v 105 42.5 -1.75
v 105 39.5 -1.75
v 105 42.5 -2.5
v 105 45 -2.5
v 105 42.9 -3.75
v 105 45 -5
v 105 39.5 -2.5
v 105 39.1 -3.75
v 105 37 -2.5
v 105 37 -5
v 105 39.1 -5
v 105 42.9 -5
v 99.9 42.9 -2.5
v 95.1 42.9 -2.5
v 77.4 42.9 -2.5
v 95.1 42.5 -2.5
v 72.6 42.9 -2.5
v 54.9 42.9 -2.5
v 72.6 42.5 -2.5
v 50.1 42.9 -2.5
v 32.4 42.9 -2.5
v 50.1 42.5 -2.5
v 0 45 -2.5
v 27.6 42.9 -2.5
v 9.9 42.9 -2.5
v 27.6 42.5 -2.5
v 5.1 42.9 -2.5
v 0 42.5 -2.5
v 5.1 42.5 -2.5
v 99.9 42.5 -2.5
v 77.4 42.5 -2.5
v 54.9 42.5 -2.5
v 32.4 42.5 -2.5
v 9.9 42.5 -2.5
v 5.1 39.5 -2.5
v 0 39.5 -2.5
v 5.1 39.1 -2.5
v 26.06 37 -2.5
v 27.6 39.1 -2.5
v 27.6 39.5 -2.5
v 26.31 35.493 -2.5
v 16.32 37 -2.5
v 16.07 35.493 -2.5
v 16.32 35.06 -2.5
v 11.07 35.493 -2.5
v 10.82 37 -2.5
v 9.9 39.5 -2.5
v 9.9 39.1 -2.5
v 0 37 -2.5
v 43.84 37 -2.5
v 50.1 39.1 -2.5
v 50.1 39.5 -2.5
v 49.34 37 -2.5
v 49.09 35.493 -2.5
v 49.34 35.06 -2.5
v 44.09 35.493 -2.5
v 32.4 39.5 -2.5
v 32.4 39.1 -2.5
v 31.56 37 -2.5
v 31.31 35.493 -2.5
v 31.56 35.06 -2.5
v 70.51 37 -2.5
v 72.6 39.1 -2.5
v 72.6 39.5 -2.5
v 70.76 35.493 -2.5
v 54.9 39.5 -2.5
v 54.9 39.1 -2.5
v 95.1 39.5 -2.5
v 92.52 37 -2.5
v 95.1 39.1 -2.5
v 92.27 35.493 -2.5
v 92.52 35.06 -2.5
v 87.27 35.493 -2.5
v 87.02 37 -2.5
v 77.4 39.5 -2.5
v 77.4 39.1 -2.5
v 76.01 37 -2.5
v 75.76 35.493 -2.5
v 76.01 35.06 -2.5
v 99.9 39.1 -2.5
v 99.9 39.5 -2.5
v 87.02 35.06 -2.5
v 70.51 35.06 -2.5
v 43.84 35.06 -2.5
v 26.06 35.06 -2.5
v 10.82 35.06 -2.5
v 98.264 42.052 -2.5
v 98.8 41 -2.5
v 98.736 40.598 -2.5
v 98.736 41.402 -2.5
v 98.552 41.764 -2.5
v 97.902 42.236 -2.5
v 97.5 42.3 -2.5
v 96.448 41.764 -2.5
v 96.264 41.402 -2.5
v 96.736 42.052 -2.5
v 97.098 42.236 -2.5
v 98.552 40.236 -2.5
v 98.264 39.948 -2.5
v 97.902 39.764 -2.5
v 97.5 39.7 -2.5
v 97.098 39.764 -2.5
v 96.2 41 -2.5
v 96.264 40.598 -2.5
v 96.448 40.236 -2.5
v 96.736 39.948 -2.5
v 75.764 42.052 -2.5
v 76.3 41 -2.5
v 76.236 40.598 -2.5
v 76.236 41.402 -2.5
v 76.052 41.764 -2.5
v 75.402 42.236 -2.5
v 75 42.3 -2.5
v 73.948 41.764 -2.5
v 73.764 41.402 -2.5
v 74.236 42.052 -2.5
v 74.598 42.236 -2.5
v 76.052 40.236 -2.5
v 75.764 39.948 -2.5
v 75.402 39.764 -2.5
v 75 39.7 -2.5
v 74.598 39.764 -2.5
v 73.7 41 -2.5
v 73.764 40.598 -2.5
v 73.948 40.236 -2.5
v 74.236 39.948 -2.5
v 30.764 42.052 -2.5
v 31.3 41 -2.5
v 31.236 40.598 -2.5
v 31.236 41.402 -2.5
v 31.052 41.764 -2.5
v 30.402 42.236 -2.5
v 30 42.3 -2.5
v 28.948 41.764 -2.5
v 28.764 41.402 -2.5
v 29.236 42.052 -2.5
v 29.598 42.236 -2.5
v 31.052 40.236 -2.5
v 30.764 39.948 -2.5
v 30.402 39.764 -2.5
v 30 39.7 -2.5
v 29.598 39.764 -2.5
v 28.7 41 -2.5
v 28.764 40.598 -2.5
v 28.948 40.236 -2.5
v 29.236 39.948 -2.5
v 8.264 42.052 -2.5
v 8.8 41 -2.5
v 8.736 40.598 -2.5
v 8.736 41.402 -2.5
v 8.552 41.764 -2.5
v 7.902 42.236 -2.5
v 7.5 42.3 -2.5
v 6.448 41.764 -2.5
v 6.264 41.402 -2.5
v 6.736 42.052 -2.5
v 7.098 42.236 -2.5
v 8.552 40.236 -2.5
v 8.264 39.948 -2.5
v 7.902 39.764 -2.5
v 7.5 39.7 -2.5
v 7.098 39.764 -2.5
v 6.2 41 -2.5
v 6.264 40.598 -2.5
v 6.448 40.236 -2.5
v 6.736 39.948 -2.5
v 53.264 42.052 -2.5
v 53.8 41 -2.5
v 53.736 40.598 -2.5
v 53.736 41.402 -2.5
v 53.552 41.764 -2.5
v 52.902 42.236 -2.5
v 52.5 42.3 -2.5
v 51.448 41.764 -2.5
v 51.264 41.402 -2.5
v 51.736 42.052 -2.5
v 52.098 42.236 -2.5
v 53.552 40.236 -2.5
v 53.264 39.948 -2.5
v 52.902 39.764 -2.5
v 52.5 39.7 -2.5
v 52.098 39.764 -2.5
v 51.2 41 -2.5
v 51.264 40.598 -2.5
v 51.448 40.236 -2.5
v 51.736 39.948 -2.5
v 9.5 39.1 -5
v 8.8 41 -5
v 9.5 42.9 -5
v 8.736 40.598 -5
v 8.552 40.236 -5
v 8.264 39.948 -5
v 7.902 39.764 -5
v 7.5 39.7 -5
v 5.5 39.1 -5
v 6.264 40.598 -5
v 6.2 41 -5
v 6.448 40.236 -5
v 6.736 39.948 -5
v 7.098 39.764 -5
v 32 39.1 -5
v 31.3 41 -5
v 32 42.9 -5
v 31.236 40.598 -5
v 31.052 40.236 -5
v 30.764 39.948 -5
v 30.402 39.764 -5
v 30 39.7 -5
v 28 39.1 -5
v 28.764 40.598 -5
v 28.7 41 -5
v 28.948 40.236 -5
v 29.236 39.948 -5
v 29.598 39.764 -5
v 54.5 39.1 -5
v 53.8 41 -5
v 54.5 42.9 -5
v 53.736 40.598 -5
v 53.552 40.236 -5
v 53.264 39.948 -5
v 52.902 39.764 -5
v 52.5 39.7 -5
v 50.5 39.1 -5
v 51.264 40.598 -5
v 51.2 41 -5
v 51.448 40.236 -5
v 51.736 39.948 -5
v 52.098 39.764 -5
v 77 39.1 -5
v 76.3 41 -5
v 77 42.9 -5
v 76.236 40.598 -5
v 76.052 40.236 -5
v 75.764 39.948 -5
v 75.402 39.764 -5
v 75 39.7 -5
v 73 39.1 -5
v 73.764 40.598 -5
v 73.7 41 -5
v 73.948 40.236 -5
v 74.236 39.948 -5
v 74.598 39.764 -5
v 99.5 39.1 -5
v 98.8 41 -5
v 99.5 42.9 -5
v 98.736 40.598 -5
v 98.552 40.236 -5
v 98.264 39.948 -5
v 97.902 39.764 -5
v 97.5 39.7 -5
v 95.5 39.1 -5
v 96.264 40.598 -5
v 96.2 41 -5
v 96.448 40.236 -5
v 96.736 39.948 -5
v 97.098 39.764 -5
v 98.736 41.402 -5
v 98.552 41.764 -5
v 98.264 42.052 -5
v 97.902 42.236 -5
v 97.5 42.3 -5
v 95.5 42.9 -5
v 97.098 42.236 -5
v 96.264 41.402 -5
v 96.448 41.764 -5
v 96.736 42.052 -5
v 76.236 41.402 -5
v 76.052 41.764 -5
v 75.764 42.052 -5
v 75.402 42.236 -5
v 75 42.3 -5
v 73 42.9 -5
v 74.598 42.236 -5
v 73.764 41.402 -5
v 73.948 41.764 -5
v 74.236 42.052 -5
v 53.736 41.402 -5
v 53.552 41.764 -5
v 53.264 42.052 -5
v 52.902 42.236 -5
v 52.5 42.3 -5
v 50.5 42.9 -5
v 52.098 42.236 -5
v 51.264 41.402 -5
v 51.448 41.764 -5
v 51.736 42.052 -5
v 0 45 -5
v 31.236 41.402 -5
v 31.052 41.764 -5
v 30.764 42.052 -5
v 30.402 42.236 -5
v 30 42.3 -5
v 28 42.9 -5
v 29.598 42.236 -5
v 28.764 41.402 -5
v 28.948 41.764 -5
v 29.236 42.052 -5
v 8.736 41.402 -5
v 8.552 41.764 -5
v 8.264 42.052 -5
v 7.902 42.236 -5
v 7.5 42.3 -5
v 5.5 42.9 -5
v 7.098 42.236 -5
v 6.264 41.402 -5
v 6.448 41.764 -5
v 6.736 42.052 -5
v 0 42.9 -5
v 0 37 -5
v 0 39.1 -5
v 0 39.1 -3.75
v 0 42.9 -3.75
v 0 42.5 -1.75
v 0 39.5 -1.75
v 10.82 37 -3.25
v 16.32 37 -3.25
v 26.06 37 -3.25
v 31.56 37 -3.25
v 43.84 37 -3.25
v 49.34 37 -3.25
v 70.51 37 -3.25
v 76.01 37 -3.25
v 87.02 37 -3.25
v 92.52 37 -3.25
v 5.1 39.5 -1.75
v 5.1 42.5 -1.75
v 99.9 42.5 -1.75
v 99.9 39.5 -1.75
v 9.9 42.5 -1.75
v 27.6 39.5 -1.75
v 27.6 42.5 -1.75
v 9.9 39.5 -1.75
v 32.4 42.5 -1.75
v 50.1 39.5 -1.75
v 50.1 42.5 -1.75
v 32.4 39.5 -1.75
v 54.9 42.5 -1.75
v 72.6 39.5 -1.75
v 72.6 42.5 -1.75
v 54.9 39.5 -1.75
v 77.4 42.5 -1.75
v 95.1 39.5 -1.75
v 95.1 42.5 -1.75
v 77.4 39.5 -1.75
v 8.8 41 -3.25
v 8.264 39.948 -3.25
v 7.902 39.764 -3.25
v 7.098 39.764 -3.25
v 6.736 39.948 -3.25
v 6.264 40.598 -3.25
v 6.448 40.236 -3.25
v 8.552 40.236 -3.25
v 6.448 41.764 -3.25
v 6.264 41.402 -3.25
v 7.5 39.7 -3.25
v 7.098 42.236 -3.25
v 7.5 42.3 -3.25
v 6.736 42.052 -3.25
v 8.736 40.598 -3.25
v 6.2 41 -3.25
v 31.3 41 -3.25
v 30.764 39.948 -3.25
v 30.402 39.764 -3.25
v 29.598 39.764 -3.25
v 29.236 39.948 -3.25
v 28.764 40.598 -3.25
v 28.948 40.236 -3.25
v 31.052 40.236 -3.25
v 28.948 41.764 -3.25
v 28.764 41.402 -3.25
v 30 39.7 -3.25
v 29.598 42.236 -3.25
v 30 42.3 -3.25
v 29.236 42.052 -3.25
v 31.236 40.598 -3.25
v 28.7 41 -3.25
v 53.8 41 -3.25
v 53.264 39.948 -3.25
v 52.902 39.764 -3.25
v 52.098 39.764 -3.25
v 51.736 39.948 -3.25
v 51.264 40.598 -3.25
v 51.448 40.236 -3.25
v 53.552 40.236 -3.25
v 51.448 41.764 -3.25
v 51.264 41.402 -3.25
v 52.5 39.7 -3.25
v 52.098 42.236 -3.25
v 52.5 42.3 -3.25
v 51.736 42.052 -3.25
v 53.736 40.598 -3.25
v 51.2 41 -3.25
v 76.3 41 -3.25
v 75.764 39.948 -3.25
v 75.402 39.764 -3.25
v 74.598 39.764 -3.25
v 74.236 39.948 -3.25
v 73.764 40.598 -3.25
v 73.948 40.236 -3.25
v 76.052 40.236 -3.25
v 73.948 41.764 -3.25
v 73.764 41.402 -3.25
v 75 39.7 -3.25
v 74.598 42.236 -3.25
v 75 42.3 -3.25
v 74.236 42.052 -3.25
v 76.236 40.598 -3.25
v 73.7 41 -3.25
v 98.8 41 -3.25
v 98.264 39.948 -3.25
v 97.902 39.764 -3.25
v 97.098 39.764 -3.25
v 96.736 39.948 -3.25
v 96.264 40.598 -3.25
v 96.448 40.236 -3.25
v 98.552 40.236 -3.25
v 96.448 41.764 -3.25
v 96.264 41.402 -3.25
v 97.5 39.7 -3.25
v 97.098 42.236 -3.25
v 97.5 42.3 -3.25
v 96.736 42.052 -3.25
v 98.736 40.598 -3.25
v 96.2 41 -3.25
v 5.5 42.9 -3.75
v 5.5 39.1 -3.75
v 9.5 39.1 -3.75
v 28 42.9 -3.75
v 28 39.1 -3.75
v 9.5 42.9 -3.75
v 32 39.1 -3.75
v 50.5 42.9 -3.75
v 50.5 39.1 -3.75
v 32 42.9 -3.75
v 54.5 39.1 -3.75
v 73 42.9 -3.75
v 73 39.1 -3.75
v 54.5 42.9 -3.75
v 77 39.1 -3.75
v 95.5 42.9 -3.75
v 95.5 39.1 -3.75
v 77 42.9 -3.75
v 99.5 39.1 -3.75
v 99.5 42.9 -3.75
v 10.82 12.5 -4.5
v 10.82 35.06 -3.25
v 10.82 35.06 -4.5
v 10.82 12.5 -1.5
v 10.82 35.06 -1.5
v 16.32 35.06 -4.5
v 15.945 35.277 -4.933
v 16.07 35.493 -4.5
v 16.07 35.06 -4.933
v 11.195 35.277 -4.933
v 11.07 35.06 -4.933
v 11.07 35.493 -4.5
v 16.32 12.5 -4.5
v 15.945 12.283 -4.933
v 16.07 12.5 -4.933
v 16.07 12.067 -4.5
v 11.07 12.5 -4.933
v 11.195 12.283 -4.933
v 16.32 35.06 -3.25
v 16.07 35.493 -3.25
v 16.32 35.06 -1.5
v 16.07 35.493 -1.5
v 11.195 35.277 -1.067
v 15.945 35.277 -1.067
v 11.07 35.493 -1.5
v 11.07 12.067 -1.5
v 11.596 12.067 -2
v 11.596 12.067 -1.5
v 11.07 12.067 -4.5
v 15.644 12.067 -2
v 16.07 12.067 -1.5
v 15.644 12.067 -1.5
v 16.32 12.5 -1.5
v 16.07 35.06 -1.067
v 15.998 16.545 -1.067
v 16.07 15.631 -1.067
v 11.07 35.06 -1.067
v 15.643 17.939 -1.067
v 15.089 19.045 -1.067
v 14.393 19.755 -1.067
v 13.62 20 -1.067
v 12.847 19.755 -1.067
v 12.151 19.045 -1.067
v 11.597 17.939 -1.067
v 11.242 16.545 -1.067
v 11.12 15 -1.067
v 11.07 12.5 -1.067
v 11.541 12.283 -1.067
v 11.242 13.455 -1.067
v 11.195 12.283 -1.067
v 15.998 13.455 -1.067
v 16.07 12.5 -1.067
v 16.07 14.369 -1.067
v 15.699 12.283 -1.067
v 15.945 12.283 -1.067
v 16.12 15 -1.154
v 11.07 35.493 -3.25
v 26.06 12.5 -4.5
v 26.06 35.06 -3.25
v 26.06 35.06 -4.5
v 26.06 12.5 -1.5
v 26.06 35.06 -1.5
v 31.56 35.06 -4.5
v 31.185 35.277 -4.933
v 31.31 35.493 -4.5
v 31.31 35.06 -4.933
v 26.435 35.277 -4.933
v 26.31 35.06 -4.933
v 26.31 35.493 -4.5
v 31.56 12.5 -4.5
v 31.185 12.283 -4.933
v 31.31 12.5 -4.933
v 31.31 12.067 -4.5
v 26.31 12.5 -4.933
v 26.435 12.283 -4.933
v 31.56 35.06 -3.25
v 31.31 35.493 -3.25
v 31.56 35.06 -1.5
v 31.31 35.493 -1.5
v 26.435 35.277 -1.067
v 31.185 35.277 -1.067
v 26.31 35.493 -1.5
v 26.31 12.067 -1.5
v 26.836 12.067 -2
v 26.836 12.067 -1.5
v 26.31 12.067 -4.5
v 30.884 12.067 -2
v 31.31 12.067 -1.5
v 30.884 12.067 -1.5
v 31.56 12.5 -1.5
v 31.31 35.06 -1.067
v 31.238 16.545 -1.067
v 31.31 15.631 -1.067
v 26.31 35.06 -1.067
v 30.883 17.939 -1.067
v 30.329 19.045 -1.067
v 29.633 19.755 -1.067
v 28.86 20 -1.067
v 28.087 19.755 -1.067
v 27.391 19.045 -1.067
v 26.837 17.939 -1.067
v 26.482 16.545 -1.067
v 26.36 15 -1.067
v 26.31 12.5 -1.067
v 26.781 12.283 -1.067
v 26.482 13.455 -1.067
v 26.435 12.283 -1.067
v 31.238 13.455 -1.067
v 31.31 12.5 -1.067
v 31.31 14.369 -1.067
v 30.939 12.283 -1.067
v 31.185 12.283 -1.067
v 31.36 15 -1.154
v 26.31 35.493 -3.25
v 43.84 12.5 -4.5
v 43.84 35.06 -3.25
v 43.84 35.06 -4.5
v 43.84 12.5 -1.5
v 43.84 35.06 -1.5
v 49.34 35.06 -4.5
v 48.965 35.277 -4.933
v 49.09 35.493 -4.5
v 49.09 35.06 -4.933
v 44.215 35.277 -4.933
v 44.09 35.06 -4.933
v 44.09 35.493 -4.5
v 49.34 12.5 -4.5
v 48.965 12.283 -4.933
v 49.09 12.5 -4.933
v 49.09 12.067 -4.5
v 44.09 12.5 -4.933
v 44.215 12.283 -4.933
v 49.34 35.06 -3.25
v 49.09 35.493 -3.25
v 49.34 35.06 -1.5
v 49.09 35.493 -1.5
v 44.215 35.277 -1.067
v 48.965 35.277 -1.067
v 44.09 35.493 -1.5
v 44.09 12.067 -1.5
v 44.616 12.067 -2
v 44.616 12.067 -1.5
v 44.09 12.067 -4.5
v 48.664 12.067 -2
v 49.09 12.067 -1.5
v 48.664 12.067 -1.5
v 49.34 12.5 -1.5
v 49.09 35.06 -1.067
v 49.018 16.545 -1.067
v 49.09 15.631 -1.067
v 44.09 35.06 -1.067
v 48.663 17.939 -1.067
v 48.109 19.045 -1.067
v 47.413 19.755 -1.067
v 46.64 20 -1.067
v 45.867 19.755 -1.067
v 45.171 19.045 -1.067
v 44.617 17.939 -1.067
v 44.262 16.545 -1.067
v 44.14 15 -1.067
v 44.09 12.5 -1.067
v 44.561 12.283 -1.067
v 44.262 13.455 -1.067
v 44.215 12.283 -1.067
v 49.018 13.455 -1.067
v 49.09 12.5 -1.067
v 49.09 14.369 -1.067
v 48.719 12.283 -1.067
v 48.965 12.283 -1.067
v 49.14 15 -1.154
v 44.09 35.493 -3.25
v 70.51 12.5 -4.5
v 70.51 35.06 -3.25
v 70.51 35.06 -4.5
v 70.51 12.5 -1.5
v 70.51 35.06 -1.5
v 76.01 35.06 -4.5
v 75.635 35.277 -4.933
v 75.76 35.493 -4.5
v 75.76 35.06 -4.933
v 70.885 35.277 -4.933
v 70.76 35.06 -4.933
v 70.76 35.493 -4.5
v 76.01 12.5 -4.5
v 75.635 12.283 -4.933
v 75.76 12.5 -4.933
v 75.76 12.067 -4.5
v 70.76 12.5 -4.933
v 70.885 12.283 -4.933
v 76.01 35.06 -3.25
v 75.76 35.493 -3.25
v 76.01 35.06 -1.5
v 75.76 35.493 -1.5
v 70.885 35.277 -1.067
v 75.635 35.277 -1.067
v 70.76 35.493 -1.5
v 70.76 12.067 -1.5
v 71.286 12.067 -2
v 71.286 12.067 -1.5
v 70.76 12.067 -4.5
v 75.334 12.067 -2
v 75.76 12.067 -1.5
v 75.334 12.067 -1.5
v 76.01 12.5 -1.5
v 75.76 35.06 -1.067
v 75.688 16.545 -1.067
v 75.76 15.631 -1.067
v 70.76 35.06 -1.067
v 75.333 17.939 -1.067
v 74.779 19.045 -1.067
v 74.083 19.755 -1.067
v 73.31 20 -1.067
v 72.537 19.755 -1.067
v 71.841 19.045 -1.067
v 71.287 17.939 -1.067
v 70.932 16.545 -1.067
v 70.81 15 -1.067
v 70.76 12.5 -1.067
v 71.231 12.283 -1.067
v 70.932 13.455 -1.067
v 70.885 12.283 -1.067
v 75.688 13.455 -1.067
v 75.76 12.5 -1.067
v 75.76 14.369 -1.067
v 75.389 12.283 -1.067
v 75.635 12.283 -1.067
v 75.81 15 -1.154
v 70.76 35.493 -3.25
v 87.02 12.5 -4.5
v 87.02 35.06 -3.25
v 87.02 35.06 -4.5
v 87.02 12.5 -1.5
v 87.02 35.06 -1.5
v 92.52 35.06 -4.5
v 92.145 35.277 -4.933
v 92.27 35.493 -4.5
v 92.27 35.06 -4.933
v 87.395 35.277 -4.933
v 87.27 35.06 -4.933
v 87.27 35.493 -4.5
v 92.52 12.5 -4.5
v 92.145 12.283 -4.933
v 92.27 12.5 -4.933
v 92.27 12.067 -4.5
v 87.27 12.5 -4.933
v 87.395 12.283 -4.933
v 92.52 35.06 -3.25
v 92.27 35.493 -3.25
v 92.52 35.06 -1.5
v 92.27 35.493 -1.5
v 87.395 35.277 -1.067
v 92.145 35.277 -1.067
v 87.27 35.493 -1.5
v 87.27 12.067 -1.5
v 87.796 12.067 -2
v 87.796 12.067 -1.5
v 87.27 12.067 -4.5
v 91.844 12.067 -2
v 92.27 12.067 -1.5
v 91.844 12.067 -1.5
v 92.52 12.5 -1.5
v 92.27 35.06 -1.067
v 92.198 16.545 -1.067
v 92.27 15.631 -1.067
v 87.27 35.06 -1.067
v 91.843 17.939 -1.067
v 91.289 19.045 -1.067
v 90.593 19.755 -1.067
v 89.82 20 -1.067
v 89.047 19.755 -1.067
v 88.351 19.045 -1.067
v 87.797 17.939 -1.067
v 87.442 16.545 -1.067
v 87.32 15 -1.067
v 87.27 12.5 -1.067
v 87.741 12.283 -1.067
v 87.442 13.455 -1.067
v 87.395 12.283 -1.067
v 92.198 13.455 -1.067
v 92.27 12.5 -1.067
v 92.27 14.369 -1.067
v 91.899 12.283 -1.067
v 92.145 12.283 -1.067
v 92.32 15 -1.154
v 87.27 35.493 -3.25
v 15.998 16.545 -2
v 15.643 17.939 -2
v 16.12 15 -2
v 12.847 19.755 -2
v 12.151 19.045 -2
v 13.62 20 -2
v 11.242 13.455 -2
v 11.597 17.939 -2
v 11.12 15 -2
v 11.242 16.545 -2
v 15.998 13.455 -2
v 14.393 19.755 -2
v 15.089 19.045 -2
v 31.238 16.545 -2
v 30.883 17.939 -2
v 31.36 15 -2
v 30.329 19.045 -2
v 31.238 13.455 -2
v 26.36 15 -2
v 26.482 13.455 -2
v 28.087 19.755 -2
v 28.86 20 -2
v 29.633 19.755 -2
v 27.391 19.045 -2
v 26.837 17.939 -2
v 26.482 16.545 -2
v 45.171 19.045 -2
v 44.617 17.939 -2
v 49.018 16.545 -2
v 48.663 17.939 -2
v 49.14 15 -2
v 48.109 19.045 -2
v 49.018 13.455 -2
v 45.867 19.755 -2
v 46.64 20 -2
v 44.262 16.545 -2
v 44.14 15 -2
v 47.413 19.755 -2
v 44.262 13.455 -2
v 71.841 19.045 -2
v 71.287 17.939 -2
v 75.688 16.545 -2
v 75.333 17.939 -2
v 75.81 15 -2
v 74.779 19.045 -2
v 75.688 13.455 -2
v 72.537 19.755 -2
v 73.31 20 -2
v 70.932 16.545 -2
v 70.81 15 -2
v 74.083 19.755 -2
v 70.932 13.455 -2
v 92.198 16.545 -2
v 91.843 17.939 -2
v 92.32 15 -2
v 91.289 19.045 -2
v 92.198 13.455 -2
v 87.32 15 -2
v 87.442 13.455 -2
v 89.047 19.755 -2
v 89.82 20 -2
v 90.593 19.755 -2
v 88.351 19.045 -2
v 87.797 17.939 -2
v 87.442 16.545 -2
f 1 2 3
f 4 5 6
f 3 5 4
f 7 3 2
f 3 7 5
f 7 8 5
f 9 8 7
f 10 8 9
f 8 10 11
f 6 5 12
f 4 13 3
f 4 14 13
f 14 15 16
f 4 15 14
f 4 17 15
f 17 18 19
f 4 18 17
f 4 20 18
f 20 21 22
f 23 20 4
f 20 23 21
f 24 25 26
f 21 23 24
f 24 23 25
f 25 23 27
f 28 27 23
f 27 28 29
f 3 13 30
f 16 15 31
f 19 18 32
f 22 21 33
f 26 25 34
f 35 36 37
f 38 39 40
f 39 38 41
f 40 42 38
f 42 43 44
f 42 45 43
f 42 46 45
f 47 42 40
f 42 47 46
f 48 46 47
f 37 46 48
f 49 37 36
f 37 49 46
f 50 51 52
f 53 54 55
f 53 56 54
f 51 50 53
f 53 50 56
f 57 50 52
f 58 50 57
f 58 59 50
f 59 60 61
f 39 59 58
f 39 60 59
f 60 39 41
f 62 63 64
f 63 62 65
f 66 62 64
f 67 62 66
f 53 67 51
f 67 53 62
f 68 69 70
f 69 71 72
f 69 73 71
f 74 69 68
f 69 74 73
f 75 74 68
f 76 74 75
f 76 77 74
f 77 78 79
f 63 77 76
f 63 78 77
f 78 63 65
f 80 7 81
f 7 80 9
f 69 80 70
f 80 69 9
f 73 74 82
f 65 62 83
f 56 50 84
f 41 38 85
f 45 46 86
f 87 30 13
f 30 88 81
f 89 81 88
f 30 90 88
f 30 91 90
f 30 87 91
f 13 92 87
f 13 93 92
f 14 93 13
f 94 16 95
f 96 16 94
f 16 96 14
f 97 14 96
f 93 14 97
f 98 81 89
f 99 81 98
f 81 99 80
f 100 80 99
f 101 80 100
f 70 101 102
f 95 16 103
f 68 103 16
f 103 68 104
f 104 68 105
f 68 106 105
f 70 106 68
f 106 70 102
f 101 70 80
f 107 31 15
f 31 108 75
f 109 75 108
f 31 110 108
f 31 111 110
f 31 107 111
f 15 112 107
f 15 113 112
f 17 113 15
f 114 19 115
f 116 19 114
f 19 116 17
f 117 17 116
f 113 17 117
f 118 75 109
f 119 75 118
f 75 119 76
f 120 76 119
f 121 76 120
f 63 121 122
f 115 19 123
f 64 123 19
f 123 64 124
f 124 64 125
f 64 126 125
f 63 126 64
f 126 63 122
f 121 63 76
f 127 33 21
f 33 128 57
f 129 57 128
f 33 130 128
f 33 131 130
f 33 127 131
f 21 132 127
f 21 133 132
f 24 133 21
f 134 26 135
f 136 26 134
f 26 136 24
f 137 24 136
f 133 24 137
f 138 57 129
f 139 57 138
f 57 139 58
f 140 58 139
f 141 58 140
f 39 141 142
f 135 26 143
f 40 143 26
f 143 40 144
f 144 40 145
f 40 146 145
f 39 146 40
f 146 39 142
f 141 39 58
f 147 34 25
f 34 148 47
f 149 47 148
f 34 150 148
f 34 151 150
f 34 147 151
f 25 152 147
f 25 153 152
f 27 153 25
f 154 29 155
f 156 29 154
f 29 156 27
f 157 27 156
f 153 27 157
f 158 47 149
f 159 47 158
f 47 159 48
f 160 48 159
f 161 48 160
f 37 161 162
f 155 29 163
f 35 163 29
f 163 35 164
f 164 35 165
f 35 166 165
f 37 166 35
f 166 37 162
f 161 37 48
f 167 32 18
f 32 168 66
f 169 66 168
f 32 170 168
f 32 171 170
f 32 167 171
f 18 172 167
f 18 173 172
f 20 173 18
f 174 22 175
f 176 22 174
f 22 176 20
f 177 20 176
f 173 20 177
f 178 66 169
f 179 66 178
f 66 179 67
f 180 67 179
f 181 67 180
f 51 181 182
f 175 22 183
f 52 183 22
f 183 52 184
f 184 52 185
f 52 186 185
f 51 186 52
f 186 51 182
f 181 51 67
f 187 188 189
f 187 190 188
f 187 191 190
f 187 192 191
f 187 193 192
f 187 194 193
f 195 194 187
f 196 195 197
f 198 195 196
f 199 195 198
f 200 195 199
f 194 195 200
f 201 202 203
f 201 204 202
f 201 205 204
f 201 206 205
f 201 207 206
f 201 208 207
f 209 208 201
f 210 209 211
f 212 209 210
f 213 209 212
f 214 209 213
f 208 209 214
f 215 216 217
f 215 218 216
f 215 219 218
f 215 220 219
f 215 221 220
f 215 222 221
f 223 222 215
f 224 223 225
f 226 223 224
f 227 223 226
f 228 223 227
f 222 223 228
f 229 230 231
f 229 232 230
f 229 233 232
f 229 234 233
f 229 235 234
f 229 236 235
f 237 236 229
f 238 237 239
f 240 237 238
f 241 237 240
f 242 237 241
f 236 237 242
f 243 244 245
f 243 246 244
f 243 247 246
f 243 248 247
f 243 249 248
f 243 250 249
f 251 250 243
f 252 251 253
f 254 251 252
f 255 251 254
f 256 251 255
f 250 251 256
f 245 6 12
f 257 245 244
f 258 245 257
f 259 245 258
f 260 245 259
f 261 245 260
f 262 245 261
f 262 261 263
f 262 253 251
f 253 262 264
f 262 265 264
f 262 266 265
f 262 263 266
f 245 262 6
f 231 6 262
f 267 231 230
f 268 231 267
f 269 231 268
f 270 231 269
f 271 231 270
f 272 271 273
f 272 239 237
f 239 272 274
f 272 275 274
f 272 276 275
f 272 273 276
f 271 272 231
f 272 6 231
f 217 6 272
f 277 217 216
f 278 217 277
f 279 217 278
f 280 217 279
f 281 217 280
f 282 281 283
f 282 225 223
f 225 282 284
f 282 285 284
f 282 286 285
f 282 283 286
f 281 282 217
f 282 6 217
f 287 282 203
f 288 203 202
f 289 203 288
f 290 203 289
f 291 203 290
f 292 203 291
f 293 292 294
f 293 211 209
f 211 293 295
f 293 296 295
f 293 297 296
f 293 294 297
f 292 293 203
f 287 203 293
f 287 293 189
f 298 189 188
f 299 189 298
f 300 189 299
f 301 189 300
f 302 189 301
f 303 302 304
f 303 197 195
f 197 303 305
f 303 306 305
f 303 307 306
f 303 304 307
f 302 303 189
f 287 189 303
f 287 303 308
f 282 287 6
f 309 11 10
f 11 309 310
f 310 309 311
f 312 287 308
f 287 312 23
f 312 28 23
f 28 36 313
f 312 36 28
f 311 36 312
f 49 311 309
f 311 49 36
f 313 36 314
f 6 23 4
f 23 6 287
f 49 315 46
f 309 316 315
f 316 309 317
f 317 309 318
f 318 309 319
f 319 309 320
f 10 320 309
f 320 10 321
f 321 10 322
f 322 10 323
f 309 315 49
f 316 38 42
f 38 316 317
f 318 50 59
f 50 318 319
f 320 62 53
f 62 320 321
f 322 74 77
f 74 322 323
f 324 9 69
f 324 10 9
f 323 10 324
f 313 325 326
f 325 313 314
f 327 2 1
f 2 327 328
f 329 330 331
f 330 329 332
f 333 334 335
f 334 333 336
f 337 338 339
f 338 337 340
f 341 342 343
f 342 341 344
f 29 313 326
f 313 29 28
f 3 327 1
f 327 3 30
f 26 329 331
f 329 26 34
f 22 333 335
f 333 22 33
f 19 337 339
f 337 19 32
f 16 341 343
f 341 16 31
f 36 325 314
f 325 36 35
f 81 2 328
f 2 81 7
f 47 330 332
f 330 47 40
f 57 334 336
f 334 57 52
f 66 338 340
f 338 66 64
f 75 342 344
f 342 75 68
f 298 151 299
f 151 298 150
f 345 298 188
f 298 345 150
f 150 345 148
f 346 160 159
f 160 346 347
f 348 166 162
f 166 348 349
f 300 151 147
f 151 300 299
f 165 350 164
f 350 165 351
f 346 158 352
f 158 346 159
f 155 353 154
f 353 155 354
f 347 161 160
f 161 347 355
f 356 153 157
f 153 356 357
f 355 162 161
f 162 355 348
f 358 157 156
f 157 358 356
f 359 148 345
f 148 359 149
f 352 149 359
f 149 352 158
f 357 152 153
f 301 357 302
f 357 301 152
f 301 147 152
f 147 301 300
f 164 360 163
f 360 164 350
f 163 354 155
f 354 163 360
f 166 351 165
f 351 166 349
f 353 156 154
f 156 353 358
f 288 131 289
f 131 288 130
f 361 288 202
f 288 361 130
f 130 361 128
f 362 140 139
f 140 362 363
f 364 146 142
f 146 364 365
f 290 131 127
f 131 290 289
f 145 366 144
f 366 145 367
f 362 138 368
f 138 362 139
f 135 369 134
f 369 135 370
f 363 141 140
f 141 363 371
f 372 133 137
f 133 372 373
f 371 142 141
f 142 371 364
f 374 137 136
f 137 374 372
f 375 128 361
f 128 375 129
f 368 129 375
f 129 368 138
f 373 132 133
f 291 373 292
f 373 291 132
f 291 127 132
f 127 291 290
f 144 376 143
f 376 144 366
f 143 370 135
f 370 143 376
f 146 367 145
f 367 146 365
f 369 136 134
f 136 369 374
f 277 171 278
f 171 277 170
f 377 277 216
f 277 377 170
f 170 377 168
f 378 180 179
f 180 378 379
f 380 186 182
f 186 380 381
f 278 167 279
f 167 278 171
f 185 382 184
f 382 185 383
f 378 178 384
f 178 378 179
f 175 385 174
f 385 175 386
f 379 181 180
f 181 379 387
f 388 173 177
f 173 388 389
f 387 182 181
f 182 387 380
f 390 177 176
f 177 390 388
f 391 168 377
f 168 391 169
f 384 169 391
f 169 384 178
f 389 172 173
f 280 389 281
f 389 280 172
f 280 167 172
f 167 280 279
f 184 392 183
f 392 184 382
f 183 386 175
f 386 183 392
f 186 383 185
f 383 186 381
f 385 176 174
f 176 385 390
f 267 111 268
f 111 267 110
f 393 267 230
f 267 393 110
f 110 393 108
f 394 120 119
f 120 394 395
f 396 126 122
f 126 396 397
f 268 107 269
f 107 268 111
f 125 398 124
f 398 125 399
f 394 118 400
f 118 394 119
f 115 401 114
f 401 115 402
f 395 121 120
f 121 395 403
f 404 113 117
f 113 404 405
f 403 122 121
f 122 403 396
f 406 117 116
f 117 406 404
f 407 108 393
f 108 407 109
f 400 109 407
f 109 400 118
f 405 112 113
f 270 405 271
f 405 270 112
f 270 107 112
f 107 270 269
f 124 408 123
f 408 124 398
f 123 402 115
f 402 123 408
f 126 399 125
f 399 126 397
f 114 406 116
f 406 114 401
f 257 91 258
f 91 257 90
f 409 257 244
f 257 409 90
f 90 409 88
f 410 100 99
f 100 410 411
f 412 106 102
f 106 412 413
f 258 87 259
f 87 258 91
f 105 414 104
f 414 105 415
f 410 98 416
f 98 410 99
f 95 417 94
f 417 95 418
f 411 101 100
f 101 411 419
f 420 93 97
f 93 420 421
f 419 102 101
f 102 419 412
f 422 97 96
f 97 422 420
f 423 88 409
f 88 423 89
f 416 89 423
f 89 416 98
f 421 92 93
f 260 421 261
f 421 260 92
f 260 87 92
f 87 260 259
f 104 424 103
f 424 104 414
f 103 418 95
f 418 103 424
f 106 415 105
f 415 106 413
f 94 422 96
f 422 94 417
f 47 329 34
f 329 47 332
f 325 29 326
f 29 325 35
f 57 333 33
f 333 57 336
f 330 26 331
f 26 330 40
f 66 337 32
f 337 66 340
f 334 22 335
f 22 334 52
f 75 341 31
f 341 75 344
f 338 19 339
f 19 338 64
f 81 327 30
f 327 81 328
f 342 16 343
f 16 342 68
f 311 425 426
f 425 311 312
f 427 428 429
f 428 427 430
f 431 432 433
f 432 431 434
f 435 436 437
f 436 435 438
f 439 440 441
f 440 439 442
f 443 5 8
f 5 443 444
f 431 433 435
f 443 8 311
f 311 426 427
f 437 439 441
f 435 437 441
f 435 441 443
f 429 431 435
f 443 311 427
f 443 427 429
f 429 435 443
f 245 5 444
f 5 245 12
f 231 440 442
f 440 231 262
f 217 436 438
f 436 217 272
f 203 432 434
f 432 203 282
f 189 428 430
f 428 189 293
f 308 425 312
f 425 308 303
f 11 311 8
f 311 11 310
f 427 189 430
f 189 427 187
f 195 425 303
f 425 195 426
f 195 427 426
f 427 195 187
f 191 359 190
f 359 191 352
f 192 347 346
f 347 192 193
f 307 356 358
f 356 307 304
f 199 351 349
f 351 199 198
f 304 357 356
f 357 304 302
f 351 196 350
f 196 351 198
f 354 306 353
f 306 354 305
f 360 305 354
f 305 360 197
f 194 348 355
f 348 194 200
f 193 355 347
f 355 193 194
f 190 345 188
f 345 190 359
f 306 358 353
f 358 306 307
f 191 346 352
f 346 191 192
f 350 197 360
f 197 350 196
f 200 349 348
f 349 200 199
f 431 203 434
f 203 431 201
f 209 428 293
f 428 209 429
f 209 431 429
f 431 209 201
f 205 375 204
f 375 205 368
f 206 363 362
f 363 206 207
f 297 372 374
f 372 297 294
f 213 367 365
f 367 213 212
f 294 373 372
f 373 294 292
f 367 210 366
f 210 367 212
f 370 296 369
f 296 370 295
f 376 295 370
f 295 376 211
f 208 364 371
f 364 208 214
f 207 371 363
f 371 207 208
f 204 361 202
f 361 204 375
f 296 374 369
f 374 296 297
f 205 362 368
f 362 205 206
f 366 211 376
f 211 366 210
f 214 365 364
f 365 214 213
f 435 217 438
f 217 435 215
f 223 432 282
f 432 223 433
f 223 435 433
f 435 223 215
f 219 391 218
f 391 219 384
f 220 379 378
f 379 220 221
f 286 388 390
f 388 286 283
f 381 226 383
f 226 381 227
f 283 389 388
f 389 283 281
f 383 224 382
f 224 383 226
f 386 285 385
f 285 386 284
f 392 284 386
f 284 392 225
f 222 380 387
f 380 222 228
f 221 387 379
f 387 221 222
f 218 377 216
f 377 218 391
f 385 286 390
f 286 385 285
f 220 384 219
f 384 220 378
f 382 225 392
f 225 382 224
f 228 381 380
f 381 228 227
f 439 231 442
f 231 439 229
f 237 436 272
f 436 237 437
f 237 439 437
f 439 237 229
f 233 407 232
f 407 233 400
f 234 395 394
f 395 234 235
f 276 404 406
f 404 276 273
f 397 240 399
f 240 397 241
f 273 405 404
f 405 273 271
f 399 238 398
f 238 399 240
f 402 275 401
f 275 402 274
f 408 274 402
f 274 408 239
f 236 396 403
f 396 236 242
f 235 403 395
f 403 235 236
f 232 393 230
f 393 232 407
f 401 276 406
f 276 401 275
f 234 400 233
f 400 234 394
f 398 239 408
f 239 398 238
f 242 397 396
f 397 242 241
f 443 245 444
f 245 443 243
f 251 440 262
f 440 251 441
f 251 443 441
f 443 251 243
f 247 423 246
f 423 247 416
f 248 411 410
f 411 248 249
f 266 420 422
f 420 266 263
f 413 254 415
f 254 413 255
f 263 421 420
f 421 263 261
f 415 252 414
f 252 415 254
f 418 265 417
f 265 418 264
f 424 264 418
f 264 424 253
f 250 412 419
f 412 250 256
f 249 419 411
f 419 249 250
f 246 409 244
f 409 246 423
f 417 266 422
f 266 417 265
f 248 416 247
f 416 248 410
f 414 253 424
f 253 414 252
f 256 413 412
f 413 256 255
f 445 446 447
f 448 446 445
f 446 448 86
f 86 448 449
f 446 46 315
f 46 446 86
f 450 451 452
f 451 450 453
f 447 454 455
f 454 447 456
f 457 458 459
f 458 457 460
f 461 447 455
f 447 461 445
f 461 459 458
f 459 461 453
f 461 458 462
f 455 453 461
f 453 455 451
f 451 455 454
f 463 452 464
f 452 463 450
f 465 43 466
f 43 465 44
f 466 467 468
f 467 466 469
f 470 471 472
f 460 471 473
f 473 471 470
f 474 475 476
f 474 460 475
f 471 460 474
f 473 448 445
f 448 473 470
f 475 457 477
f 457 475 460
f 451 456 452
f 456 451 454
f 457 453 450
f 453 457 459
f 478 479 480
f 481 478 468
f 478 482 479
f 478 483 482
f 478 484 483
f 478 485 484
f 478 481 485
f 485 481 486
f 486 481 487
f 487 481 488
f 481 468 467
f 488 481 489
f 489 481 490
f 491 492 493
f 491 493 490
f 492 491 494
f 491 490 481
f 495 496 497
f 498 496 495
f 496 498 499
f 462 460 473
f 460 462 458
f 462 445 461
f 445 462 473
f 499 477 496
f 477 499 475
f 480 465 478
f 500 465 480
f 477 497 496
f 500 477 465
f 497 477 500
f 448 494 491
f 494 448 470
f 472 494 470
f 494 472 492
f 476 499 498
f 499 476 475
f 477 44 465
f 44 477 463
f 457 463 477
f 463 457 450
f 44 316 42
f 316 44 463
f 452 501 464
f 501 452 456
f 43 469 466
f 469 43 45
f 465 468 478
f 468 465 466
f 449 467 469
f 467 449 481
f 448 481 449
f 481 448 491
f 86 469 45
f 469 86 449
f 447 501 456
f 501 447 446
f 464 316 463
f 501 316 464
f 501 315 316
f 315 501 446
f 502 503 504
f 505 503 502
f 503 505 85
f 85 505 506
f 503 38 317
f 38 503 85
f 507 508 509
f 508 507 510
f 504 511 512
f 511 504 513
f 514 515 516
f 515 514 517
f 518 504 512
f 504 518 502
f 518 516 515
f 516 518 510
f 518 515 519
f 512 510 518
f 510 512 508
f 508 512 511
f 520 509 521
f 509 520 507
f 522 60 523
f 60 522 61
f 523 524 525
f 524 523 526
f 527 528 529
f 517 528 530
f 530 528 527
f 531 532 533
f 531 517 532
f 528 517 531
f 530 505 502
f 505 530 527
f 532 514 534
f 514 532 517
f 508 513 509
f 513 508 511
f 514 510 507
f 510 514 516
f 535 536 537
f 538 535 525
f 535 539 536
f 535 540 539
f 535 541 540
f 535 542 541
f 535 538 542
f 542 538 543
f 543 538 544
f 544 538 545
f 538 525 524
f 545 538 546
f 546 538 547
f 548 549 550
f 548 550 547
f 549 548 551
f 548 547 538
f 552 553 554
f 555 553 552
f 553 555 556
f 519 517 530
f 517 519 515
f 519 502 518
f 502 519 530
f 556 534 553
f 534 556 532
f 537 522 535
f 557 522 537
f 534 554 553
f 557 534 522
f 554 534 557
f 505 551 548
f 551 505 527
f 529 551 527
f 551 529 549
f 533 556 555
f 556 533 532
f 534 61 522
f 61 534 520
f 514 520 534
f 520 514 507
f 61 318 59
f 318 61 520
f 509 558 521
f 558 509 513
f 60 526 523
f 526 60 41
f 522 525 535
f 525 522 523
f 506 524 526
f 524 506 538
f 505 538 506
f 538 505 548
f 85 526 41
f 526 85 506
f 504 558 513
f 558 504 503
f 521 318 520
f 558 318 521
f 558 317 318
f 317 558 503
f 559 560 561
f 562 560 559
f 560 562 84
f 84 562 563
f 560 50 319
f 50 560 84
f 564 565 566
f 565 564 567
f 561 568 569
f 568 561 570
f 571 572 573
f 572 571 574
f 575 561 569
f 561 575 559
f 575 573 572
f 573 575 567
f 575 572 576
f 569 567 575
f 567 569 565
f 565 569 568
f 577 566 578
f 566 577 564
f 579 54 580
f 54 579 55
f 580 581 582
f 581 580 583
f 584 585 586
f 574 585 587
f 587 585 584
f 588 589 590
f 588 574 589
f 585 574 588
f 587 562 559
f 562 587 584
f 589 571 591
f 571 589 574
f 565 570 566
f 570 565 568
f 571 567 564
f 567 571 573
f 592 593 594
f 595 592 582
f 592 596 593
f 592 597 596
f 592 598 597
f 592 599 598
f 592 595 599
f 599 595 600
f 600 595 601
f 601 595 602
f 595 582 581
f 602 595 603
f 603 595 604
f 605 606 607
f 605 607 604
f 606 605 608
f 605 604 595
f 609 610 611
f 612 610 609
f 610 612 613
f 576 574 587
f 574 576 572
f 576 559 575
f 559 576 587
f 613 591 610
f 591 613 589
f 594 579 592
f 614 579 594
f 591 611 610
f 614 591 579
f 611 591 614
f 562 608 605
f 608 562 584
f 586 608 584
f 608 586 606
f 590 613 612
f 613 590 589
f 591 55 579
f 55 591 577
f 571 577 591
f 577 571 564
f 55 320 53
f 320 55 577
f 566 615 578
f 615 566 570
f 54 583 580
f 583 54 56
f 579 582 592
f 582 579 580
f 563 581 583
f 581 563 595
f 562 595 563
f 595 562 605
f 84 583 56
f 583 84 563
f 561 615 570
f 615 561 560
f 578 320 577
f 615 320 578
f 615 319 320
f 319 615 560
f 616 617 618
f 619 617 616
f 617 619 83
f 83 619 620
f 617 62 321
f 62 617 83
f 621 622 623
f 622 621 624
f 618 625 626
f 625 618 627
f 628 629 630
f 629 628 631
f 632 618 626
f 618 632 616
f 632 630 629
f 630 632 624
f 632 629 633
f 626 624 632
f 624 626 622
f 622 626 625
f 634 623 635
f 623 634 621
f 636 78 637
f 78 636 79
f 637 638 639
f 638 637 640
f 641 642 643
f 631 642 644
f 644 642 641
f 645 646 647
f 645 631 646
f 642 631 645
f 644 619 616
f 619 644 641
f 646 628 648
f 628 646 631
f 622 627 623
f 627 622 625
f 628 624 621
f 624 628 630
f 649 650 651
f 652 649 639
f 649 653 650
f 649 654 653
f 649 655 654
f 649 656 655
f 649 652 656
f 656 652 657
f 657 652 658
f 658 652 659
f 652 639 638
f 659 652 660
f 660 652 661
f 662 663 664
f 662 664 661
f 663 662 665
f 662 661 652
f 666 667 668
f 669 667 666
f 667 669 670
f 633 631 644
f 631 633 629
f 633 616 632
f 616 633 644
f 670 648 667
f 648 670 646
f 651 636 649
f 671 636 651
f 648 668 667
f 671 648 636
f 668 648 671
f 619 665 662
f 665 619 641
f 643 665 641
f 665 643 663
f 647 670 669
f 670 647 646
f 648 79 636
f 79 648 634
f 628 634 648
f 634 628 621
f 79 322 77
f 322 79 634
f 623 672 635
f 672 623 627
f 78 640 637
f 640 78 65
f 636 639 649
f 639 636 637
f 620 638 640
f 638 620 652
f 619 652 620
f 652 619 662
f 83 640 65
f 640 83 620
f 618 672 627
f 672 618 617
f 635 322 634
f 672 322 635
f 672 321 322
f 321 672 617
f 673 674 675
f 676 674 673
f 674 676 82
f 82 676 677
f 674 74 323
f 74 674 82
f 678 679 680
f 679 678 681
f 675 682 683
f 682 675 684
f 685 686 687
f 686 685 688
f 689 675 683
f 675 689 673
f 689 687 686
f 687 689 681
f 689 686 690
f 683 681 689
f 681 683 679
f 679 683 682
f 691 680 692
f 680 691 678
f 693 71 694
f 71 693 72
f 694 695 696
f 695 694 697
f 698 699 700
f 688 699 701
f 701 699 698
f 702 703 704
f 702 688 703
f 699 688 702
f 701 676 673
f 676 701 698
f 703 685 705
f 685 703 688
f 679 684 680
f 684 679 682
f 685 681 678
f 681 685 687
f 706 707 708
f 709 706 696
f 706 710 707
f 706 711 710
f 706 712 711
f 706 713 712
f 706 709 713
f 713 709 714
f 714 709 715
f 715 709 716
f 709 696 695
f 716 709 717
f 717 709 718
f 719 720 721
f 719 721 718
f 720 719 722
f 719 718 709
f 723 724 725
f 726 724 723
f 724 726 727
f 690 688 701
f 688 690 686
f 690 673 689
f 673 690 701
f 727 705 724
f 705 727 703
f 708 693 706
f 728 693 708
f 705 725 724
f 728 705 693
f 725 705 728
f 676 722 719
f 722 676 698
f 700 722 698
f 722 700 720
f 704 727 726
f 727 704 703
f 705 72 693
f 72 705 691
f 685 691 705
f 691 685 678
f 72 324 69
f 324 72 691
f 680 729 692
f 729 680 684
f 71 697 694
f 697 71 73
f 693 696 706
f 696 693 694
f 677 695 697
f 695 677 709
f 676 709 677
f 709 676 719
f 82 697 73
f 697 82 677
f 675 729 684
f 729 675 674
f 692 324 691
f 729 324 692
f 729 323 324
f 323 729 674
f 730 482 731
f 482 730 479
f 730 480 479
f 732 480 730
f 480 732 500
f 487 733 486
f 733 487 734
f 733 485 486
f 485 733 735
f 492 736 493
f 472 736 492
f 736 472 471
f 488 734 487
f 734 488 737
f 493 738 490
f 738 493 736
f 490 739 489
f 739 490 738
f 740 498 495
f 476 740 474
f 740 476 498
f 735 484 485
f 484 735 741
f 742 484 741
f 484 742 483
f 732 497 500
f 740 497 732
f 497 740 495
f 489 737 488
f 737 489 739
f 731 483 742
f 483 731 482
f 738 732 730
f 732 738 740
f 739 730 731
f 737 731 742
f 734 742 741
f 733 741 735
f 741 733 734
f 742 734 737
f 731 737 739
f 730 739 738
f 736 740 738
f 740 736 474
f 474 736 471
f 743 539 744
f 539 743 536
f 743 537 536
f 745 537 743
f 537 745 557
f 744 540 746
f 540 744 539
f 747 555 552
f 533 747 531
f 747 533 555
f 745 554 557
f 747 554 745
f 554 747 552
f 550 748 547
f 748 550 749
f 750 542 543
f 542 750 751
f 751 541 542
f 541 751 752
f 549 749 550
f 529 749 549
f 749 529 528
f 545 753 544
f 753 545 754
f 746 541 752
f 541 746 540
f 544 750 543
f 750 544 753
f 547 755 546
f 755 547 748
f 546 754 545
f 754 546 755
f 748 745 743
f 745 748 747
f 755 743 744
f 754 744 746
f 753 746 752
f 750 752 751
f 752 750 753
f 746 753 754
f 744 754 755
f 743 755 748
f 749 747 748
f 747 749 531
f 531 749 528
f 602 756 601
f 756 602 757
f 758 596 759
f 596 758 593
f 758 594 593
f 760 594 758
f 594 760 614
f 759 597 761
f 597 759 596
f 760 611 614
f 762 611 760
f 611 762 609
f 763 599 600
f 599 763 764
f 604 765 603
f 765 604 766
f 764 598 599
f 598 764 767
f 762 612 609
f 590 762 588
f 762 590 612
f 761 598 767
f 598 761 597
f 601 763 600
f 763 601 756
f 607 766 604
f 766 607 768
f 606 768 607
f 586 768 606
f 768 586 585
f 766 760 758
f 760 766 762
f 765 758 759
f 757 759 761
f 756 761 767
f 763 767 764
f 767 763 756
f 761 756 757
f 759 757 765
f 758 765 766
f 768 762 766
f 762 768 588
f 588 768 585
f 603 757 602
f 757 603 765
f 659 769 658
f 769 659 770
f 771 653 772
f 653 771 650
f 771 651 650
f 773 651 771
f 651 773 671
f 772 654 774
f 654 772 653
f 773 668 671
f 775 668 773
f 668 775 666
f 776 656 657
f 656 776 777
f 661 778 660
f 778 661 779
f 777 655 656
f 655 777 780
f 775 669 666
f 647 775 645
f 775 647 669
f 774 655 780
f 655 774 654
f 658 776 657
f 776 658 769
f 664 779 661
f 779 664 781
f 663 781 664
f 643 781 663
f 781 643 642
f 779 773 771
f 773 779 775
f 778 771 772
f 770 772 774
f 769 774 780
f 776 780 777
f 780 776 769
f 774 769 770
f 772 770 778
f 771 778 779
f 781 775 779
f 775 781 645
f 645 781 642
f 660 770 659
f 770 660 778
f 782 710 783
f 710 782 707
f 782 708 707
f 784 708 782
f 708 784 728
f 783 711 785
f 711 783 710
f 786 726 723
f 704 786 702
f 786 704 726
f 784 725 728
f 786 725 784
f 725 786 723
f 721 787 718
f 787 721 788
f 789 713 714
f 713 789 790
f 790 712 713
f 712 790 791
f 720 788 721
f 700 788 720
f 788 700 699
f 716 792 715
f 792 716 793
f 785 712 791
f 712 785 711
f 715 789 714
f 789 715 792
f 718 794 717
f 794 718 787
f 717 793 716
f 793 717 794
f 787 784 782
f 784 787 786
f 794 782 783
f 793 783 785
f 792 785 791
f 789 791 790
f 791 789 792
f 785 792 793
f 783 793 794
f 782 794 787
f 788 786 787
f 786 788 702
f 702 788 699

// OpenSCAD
$fn = 20;
//white key total length
wktl = 38-3;

//black key total length
bktl = 26-3-.5;

//white keys total width
wktw = 105;

//black key total width
bktw = 5.5;

//distance between keys
dbk = 8;


//dist1
d1 = 7.62;

//dist2
d2 = 8.89;


//white key thickness
wkth = 2.5;

//black key thickness
bkth = 4;

//white key lip height
wklh = 5;

//spring length
sl = 2;

//black spring length
bsl = 2;

//spring width
sw = 10;

//spring thickness
sth = .75;

//key tolerance
key_tol = .9;

//black key tolerance
black_key_tol = 1.5;

//distance between white keys
dbwk = wktw+key_tol;


module white_keys()
{
  //slim width
  sw = wktw-bktw-key_tol;

  
  union()
  {
  cube([wktw,wktl,wkth]);
  translate([0,-wkth,0])
  cube([wktw,wkth,wklh]);
  }



  
  /*
  translate([0,wktl+sl,0])
  color("brown")
  translate([bktw/2+key_tol/2,0,0])
  {


  difference()
  {
  cube([sw,8,wkth]);
  translate([sw/2,4,-2])
  cylinder(r=1.6, h=10);
  }
  }
  */

  //spring
  translate([0,wktl,wkth-sth])
  //cube([sw,sl,sth]);
  cube([wktw,sl,sth]);

}


module black_key(tol=0)
{

  difference()
  {
  minkowski()
  {
    translate([.5-tol,-tol,0])
    cube([bktw-1+tol*2, bktl-.4+tol*2+tol+.46, bkth-1]);
    sphere(r=.5, $fn=6);
  }

  //foil hole
  //translate([1,1,bkth-2])
  //cube([bktw-2,bktw,5]);
  }

  //spring
  translate([0,bktl,wkth-sth-.5])
  cube([bktw,bsl,sth]);


  //translate([bktw/2,0,bkth])
  //foil_holder();

}

module foil_holder()
{
  /*
  height=2;
  diameter=6+1;
  thickness=1;
  d = diameter;

  translate([0,diameter/2-3,0])
  difference()
  {
    scale([1,1.5,1])
    cylinder(d=diameter, h=height);
    //cylinder(d=diameter-thickness*2, h=height);
    scale([1,1.5,1])
    translate([-d/2,-d/2,height-.8])
    rotate([6,0,0])
    cube([d,d+.2,10]);
  }
  */
  translate([0,0,-2])
  scale([1,2,1])
  cylinder(d=5, h=2.2);


}


module holder_bar(length=wktw)
{
  width = 8;
  ridge_width=3;
  ridge_height=.75;
  tol = .8;
  hole_diameter=2.6;

  square_width=4;

  w = 22.5;

  difference()
  {
  union()
  {
  cube([length,width,wkth]);
  //ridge
  translate([0,width/2-ridge_width/2,0])
  cube([length,ridge_width,wkth+ridge_height]);

  }

  for(i=[0:4])
  translate([7.5+i*w,width/2,-1])
  cylinder(d=hole_diameter,h=10);


  //cubes
  for(i=[0:4])
  translate([7.5+i*w,width/2,wkth+ridge_height/2])
  //cylinder(d=2.5,h=10);
  cube([square_width+tol,ridge_width+tol,ridge_height], center=true);



  //ridge
  translate([0,width/2-ridge_width/2-tol/2,-2])
  cube([length,ridge_width+tol,wkth+ridge_height]);
  }


  //cubes with cylindrical holes
  for(i=[0:4])
  {
  translate([7.5+i*w,width/2,ridge_height/2+.5])
  difference()
  {
  cube([square_width,ridge_width+tol,ridge_height+1], center=true);
  translate([0,0,-5])
  cylinder(d=hole_diameter,h=10);
  }

  }


}

module all_black_keys()
{
  translate([0,bktl+bsl,0])
  holder_bar();


  difference()
  {
  translate([3+.2,0,.5])
  union()
  {
  translate([d1,0,0])
  black_key();

  translate([d1*3, 0,0])
  black_key();

  translate([d1*3+d2*2, 0,0])
  black_key();

  translate([d1*3+d2*5, 0,0])
  black_key();

  translate([d1*4+d2*6, 0,0])
  black_key();
  }




  }

  //translate([-6+d1,0,5])
  //foil_holder();
}


module all_white_keys()
{
  //total length
  //tl = dbwk*7-key_tol;
  tl = dbwk*7;

  translate([0,wktl+sl,0])
  holder_bar();



white_keys();

}




difference()
{
union()
{
translate([0,wktl-bktl-(bsl-sl),-5])
all_black_keys();
//all_white_keys();
}


  //white keys!
  translate([2+4,-7+3+4,0])
  {
  translate([0,15,wkth])
  foil_holder();


  translate([d1*2,15,wkth])
  foil_holder();


  translate([d1*3+d2,15,wkth])
  foil_holder();


  translate([d1*3+d2*3,15,wkth])
  foil_holder();

  translate([d1*3+d2*4,15,wkth])
  foil_holder();

  translate([d1*3+d2*6,15,wkth])
  foil_holder();


  translate([d1*5+d2*6,15,wkth])
  foil_holder();
  }


  //black keys
  translate([6,15,0])
  {
  translate([d1,0,0])
  foil_holder();

  translate([d1*3,0,0])
  foil_holder();

  translate([d1*3+d2*2,0,0])
  foil_holder();

  translate([d1*3+d2*5,0,0])
  foil_holder();

  translate([d1*4+d2*6,0,0])
  foil_holder();
  }

  translate([3,12,0])
  {
translate([d1,0,0])
  black_key(tol=1);

  translate([d1*3, 0,0])
  black_key(tol=1);

  translate([d1*3+d2*2, 0,0])
  black_key(tol=1);

  translate([d1*3+d2*5, 0,0])
  black_key(tol=1);

  translate([d1*4+d2*6, 0,0])
  black_key(tol=1);
  }


  //slits
  translate([d1*2-(bktw-1)/2,-30,-1])
  cube([1,42,20]);

  translate([d1*2-(bktw-1)/2+d1+d1,-30,-1])
  cube([1,42,20]);

  translate([d1*2-(bktw-1)/2+d1+d1+d2+d2,-30,-1])
  cube([1,42,20]);

  translate([d1*2-(bktw-1)/2+d1+d1+d2+d2+d2+d2/2,-30,-1])
  cube([1,66,20]);

  translate([d1*2-(bktw-1)/2+d1+d1+d2+d2+d2+d2/2+d2+d2/2,-30,-1])
  cube([1,42,20]);

  translate([d1*2-(bktw-1)/2+d1+d1+d2+d2+d2+d2/2+d2+d2/2+d1+d2,-30,-1])
  cube([1,42,20]);

}
